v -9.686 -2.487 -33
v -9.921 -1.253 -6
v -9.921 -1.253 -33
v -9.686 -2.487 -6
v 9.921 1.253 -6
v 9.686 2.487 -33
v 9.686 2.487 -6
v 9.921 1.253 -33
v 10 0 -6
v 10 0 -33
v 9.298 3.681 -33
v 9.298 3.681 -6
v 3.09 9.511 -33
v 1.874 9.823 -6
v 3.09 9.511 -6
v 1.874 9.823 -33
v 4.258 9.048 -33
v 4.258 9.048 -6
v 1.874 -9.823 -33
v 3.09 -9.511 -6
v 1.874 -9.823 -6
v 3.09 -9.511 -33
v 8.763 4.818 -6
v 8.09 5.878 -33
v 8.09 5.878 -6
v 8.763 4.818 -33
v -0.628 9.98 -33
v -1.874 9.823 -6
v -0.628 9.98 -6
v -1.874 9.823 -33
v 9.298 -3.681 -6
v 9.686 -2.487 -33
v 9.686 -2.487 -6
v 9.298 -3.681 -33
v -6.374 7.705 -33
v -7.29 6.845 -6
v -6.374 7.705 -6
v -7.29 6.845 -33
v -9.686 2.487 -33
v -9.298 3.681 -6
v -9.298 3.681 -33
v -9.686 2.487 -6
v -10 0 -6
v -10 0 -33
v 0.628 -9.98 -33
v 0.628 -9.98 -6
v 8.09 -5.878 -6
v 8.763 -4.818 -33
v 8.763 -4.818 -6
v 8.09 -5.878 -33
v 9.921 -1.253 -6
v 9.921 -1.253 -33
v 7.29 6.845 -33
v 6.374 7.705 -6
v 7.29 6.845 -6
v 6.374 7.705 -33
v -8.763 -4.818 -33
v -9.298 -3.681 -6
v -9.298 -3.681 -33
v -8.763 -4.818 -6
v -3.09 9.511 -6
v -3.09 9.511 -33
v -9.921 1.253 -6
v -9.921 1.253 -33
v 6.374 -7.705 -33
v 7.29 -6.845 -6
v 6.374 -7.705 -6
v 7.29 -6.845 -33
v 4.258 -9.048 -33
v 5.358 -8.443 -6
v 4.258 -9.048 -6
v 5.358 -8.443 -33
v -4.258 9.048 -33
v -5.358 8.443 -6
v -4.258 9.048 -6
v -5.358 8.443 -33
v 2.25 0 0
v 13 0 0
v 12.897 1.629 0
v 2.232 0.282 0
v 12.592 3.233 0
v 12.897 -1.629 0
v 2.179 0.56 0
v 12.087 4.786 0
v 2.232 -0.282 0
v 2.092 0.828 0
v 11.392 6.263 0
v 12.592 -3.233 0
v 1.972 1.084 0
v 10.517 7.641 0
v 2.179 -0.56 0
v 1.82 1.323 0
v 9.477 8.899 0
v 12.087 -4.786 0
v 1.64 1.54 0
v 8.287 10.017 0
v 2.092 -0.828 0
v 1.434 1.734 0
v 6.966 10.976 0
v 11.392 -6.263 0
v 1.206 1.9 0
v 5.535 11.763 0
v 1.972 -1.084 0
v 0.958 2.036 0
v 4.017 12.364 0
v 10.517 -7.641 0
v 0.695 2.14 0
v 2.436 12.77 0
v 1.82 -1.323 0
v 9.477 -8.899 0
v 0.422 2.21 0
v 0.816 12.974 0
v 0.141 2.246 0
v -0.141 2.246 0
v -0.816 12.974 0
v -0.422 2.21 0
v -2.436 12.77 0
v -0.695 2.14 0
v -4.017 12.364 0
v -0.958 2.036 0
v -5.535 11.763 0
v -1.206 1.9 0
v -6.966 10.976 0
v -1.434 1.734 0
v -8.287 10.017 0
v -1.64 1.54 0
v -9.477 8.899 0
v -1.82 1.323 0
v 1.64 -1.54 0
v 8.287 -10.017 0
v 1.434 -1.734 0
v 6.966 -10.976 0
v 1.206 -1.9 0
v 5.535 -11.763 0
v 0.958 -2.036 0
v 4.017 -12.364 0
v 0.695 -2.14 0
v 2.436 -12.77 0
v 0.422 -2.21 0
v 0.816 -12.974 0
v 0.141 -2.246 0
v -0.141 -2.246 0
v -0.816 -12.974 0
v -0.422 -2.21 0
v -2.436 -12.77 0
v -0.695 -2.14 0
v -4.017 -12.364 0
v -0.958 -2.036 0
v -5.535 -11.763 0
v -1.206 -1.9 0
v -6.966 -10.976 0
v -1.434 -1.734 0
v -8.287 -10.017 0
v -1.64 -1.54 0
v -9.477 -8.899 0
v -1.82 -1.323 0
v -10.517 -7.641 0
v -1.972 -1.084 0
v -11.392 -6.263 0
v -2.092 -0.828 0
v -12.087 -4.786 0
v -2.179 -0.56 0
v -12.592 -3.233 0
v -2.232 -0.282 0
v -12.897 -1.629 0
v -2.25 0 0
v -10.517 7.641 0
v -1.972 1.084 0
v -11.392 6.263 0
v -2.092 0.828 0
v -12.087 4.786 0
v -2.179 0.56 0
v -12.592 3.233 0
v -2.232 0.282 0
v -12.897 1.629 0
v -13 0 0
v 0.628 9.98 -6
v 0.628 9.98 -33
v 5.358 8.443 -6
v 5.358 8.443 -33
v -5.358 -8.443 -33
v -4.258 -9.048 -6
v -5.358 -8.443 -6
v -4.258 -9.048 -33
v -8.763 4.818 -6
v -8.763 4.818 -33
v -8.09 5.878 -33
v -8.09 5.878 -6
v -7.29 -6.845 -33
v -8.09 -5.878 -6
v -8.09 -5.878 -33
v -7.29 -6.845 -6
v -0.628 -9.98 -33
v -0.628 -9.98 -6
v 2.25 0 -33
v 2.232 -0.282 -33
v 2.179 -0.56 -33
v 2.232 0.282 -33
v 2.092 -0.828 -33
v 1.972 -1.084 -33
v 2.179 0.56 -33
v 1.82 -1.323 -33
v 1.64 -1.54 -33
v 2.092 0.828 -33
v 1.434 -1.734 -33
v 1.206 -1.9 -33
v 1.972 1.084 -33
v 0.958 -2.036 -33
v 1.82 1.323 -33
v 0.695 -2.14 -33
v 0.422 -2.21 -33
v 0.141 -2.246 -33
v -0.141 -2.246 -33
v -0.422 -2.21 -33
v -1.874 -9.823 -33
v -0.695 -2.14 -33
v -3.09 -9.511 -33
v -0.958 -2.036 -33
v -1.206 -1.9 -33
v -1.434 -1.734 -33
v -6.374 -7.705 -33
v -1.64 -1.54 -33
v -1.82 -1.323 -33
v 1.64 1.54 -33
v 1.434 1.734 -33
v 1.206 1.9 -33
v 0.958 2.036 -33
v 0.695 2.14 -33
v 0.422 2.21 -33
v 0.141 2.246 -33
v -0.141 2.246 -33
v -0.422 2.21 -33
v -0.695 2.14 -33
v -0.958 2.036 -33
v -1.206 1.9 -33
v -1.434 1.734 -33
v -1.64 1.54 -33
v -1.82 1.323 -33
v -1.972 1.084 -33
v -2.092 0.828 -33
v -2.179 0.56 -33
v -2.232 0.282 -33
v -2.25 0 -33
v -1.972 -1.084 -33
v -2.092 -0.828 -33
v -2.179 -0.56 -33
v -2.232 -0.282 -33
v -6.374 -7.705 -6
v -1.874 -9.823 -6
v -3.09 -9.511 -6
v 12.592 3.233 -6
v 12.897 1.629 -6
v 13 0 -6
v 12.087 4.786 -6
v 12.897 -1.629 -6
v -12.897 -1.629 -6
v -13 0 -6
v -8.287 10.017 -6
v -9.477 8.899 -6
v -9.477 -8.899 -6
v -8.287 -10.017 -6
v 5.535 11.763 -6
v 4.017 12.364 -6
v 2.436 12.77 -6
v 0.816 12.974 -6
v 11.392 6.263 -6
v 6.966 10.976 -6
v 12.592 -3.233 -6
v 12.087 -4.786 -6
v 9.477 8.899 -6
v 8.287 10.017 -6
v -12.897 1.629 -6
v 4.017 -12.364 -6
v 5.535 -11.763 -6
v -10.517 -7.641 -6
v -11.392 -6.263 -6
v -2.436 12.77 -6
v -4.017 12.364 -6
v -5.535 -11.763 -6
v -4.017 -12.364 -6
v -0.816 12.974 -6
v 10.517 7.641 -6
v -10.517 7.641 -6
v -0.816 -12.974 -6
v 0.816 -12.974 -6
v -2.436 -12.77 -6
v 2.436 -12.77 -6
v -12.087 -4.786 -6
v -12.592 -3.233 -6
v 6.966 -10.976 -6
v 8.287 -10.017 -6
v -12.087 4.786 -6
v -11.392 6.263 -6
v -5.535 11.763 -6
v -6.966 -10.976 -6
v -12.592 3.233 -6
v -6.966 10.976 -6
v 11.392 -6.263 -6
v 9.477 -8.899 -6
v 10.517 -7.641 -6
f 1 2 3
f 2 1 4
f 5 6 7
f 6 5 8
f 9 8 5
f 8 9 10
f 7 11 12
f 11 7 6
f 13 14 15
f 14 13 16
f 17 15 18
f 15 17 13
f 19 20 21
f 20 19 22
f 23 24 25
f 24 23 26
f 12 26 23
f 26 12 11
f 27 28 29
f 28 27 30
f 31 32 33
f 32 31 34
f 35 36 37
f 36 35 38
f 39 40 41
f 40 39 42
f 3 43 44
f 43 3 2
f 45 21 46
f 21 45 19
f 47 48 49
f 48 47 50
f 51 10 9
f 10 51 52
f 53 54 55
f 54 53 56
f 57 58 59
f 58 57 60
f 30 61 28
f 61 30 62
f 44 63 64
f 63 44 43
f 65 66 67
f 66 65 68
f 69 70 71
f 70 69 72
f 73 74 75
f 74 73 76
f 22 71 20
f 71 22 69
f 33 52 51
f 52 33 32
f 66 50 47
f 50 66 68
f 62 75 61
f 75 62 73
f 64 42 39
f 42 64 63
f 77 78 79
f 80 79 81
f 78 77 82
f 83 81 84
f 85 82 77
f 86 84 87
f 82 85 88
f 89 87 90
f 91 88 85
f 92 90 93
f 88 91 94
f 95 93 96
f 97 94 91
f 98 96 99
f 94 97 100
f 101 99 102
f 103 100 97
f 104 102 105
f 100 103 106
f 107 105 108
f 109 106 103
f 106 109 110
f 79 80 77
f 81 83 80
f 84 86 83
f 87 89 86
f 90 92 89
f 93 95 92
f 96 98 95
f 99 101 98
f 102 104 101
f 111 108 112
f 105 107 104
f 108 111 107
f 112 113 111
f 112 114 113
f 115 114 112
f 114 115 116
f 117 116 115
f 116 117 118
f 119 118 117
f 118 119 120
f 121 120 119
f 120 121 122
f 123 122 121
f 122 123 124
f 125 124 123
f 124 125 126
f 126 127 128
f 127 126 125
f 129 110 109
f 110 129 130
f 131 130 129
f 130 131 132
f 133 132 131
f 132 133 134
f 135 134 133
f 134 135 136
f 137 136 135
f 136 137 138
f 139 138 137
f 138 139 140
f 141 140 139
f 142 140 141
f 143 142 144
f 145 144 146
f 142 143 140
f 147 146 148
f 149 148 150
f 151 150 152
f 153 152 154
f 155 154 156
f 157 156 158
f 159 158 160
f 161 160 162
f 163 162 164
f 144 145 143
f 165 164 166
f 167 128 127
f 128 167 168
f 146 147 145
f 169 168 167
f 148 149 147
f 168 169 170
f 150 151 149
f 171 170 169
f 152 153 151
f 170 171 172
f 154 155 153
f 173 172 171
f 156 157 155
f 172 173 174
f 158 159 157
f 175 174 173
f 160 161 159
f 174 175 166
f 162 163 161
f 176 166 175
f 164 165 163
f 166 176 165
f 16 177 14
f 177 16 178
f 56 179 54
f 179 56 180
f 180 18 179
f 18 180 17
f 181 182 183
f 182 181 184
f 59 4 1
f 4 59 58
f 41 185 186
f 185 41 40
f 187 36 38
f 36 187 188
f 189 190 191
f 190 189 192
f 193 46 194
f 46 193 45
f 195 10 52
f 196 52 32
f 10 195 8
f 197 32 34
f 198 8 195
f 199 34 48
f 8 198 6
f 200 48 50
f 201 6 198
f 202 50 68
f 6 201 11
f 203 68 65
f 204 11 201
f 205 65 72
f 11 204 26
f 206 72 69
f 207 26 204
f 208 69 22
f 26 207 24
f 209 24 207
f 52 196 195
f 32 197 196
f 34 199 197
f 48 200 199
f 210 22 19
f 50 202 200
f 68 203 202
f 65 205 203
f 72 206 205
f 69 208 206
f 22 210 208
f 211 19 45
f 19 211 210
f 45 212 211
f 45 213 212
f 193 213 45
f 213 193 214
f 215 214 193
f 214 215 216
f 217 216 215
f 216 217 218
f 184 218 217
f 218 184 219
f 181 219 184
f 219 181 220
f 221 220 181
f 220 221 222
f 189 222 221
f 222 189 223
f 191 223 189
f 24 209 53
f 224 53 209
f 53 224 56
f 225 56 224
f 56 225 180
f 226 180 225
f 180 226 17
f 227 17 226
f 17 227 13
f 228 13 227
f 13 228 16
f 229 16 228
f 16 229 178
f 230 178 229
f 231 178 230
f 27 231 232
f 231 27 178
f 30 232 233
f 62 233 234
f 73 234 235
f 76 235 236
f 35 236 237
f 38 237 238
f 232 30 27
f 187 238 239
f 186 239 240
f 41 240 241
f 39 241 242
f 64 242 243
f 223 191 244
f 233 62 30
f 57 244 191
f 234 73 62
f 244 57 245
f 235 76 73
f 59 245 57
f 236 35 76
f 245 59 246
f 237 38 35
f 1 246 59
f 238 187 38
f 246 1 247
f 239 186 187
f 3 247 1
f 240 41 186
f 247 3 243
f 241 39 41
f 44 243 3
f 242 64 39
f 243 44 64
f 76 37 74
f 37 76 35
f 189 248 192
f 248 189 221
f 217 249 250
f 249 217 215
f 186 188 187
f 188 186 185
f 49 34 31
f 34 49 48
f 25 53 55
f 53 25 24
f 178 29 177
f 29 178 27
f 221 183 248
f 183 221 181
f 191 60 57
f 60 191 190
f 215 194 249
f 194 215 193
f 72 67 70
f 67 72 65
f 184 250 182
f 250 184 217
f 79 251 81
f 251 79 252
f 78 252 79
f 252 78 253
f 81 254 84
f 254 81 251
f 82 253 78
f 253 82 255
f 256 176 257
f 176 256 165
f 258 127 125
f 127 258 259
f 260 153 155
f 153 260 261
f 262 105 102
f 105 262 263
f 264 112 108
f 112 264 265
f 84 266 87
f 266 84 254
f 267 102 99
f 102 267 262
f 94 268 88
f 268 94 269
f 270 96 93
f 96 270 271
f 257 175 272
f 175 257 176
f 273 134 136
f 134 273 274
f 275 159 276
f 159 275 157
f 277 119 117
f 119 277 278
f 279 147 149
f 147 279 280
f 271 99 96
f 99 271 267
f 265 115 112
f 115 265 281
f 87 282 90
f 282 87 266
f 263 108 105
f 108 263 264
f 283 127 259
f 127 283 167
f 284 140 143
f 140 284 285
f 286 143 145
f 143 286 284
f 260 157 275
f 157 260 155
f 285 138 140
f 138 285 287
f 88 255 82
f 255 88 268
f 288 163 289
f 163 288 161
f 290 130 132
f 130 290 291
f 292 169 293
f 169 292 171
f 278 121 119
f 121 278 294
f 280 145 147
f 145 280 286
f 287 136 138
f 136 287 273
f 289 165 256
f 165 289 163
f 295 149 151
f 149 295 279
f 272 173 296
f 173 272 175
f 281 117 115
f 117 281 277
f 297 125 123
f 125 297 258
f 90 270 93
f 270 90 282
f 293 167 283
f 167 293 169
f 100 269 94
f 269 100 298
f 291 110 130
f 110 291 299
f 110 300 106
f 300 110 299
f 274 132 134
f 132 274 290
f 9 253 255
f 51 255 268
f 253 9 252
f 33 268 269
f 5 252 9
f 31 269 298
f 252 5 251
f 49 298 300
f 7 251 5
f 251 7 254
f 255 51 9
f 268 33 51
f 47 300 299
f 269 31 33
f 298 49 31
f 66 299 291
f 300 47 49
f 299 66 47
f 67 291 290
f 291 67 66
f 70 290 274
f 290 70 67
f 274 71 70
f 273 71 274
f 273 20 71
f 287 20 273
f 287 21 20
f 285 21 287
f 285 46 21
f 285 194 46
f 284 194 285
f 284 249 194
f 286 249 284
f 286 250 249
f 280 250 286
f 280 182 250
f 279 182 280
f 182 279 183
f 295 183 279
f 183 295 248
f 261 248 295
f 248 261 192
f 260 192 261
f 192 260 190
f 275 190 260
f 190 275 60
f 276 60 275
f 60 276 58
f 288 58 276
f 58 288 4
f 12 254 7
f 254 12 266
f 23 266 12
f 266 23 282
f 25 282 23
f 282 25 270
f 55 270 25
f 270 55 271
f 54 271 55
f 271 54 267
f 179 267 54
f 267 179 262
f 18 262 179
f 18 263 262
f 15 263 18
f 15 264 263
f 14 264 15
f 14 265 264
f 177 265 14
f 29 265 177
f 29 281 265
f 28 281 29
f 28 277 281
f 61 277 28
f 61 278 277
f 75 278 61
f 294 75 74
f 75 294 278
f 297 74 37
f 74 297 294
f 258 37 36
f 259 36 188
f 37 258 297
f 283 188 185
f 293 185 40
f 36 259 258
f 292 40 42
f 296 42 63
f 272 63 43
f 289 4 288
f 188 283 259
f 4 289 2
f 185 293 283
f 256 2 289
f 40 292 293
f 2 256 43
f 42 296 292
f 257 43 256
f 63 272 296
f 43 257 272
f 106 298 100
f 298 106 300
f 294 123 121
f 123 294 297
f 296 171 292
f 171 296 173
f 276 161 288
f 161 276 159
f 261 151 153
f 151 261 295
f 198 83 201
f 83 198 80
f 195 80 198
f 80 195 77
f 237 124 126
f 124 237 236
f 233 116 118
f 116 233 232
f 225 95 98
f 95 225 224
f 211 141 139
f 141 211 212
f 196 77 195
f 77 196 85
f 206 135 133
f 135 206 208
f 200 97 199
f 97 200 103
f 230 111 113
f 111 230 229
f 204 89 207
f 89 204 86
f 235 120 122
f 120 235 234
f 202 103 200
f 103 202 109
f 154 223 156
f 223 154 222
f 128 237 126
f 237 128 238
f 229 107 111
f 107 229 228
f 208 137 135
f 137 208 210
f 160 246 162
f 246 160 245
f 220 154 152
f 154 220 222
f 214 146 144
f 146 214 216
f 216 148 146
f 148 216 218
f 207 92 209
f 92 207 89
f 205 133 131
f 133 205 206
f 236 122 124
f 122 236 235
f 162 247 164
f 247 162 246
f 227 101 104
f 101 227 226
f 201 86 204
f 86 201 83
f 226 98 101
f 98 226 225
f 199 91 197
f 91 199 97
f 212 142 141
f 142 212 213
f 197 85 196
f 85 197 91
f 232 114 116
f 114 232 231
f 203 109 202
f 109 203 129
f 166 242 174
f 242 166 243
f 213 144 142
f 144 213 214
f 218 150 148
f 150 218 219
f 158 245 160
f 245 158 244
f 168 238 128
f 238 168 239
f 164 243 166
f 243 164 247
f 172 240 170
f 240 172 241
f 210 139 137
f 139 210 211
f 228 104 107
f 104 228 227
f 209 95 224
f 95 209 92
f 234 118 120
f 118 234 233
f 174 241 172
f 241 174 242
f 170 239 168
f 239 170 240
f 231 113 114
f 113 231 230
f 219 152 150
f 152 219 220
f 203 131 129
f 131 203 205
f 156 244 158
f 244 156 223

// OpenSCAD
$fn = 50;


difference() {
	union() {
		translate(v = [0, 0, -33.0000000000]) {
			cylinder(h = 33, r = 10.0000000000);
		}
		translate(v = [0, 0, -6.0000000000]) {
			cylinder(h = 6, r = 13.0000000000);
		}
	}
	union() {
		#translate(v = [0, 0, -33]) {
			cylinder(h = 33, r = 2.2500000000);
		}
	}
}
